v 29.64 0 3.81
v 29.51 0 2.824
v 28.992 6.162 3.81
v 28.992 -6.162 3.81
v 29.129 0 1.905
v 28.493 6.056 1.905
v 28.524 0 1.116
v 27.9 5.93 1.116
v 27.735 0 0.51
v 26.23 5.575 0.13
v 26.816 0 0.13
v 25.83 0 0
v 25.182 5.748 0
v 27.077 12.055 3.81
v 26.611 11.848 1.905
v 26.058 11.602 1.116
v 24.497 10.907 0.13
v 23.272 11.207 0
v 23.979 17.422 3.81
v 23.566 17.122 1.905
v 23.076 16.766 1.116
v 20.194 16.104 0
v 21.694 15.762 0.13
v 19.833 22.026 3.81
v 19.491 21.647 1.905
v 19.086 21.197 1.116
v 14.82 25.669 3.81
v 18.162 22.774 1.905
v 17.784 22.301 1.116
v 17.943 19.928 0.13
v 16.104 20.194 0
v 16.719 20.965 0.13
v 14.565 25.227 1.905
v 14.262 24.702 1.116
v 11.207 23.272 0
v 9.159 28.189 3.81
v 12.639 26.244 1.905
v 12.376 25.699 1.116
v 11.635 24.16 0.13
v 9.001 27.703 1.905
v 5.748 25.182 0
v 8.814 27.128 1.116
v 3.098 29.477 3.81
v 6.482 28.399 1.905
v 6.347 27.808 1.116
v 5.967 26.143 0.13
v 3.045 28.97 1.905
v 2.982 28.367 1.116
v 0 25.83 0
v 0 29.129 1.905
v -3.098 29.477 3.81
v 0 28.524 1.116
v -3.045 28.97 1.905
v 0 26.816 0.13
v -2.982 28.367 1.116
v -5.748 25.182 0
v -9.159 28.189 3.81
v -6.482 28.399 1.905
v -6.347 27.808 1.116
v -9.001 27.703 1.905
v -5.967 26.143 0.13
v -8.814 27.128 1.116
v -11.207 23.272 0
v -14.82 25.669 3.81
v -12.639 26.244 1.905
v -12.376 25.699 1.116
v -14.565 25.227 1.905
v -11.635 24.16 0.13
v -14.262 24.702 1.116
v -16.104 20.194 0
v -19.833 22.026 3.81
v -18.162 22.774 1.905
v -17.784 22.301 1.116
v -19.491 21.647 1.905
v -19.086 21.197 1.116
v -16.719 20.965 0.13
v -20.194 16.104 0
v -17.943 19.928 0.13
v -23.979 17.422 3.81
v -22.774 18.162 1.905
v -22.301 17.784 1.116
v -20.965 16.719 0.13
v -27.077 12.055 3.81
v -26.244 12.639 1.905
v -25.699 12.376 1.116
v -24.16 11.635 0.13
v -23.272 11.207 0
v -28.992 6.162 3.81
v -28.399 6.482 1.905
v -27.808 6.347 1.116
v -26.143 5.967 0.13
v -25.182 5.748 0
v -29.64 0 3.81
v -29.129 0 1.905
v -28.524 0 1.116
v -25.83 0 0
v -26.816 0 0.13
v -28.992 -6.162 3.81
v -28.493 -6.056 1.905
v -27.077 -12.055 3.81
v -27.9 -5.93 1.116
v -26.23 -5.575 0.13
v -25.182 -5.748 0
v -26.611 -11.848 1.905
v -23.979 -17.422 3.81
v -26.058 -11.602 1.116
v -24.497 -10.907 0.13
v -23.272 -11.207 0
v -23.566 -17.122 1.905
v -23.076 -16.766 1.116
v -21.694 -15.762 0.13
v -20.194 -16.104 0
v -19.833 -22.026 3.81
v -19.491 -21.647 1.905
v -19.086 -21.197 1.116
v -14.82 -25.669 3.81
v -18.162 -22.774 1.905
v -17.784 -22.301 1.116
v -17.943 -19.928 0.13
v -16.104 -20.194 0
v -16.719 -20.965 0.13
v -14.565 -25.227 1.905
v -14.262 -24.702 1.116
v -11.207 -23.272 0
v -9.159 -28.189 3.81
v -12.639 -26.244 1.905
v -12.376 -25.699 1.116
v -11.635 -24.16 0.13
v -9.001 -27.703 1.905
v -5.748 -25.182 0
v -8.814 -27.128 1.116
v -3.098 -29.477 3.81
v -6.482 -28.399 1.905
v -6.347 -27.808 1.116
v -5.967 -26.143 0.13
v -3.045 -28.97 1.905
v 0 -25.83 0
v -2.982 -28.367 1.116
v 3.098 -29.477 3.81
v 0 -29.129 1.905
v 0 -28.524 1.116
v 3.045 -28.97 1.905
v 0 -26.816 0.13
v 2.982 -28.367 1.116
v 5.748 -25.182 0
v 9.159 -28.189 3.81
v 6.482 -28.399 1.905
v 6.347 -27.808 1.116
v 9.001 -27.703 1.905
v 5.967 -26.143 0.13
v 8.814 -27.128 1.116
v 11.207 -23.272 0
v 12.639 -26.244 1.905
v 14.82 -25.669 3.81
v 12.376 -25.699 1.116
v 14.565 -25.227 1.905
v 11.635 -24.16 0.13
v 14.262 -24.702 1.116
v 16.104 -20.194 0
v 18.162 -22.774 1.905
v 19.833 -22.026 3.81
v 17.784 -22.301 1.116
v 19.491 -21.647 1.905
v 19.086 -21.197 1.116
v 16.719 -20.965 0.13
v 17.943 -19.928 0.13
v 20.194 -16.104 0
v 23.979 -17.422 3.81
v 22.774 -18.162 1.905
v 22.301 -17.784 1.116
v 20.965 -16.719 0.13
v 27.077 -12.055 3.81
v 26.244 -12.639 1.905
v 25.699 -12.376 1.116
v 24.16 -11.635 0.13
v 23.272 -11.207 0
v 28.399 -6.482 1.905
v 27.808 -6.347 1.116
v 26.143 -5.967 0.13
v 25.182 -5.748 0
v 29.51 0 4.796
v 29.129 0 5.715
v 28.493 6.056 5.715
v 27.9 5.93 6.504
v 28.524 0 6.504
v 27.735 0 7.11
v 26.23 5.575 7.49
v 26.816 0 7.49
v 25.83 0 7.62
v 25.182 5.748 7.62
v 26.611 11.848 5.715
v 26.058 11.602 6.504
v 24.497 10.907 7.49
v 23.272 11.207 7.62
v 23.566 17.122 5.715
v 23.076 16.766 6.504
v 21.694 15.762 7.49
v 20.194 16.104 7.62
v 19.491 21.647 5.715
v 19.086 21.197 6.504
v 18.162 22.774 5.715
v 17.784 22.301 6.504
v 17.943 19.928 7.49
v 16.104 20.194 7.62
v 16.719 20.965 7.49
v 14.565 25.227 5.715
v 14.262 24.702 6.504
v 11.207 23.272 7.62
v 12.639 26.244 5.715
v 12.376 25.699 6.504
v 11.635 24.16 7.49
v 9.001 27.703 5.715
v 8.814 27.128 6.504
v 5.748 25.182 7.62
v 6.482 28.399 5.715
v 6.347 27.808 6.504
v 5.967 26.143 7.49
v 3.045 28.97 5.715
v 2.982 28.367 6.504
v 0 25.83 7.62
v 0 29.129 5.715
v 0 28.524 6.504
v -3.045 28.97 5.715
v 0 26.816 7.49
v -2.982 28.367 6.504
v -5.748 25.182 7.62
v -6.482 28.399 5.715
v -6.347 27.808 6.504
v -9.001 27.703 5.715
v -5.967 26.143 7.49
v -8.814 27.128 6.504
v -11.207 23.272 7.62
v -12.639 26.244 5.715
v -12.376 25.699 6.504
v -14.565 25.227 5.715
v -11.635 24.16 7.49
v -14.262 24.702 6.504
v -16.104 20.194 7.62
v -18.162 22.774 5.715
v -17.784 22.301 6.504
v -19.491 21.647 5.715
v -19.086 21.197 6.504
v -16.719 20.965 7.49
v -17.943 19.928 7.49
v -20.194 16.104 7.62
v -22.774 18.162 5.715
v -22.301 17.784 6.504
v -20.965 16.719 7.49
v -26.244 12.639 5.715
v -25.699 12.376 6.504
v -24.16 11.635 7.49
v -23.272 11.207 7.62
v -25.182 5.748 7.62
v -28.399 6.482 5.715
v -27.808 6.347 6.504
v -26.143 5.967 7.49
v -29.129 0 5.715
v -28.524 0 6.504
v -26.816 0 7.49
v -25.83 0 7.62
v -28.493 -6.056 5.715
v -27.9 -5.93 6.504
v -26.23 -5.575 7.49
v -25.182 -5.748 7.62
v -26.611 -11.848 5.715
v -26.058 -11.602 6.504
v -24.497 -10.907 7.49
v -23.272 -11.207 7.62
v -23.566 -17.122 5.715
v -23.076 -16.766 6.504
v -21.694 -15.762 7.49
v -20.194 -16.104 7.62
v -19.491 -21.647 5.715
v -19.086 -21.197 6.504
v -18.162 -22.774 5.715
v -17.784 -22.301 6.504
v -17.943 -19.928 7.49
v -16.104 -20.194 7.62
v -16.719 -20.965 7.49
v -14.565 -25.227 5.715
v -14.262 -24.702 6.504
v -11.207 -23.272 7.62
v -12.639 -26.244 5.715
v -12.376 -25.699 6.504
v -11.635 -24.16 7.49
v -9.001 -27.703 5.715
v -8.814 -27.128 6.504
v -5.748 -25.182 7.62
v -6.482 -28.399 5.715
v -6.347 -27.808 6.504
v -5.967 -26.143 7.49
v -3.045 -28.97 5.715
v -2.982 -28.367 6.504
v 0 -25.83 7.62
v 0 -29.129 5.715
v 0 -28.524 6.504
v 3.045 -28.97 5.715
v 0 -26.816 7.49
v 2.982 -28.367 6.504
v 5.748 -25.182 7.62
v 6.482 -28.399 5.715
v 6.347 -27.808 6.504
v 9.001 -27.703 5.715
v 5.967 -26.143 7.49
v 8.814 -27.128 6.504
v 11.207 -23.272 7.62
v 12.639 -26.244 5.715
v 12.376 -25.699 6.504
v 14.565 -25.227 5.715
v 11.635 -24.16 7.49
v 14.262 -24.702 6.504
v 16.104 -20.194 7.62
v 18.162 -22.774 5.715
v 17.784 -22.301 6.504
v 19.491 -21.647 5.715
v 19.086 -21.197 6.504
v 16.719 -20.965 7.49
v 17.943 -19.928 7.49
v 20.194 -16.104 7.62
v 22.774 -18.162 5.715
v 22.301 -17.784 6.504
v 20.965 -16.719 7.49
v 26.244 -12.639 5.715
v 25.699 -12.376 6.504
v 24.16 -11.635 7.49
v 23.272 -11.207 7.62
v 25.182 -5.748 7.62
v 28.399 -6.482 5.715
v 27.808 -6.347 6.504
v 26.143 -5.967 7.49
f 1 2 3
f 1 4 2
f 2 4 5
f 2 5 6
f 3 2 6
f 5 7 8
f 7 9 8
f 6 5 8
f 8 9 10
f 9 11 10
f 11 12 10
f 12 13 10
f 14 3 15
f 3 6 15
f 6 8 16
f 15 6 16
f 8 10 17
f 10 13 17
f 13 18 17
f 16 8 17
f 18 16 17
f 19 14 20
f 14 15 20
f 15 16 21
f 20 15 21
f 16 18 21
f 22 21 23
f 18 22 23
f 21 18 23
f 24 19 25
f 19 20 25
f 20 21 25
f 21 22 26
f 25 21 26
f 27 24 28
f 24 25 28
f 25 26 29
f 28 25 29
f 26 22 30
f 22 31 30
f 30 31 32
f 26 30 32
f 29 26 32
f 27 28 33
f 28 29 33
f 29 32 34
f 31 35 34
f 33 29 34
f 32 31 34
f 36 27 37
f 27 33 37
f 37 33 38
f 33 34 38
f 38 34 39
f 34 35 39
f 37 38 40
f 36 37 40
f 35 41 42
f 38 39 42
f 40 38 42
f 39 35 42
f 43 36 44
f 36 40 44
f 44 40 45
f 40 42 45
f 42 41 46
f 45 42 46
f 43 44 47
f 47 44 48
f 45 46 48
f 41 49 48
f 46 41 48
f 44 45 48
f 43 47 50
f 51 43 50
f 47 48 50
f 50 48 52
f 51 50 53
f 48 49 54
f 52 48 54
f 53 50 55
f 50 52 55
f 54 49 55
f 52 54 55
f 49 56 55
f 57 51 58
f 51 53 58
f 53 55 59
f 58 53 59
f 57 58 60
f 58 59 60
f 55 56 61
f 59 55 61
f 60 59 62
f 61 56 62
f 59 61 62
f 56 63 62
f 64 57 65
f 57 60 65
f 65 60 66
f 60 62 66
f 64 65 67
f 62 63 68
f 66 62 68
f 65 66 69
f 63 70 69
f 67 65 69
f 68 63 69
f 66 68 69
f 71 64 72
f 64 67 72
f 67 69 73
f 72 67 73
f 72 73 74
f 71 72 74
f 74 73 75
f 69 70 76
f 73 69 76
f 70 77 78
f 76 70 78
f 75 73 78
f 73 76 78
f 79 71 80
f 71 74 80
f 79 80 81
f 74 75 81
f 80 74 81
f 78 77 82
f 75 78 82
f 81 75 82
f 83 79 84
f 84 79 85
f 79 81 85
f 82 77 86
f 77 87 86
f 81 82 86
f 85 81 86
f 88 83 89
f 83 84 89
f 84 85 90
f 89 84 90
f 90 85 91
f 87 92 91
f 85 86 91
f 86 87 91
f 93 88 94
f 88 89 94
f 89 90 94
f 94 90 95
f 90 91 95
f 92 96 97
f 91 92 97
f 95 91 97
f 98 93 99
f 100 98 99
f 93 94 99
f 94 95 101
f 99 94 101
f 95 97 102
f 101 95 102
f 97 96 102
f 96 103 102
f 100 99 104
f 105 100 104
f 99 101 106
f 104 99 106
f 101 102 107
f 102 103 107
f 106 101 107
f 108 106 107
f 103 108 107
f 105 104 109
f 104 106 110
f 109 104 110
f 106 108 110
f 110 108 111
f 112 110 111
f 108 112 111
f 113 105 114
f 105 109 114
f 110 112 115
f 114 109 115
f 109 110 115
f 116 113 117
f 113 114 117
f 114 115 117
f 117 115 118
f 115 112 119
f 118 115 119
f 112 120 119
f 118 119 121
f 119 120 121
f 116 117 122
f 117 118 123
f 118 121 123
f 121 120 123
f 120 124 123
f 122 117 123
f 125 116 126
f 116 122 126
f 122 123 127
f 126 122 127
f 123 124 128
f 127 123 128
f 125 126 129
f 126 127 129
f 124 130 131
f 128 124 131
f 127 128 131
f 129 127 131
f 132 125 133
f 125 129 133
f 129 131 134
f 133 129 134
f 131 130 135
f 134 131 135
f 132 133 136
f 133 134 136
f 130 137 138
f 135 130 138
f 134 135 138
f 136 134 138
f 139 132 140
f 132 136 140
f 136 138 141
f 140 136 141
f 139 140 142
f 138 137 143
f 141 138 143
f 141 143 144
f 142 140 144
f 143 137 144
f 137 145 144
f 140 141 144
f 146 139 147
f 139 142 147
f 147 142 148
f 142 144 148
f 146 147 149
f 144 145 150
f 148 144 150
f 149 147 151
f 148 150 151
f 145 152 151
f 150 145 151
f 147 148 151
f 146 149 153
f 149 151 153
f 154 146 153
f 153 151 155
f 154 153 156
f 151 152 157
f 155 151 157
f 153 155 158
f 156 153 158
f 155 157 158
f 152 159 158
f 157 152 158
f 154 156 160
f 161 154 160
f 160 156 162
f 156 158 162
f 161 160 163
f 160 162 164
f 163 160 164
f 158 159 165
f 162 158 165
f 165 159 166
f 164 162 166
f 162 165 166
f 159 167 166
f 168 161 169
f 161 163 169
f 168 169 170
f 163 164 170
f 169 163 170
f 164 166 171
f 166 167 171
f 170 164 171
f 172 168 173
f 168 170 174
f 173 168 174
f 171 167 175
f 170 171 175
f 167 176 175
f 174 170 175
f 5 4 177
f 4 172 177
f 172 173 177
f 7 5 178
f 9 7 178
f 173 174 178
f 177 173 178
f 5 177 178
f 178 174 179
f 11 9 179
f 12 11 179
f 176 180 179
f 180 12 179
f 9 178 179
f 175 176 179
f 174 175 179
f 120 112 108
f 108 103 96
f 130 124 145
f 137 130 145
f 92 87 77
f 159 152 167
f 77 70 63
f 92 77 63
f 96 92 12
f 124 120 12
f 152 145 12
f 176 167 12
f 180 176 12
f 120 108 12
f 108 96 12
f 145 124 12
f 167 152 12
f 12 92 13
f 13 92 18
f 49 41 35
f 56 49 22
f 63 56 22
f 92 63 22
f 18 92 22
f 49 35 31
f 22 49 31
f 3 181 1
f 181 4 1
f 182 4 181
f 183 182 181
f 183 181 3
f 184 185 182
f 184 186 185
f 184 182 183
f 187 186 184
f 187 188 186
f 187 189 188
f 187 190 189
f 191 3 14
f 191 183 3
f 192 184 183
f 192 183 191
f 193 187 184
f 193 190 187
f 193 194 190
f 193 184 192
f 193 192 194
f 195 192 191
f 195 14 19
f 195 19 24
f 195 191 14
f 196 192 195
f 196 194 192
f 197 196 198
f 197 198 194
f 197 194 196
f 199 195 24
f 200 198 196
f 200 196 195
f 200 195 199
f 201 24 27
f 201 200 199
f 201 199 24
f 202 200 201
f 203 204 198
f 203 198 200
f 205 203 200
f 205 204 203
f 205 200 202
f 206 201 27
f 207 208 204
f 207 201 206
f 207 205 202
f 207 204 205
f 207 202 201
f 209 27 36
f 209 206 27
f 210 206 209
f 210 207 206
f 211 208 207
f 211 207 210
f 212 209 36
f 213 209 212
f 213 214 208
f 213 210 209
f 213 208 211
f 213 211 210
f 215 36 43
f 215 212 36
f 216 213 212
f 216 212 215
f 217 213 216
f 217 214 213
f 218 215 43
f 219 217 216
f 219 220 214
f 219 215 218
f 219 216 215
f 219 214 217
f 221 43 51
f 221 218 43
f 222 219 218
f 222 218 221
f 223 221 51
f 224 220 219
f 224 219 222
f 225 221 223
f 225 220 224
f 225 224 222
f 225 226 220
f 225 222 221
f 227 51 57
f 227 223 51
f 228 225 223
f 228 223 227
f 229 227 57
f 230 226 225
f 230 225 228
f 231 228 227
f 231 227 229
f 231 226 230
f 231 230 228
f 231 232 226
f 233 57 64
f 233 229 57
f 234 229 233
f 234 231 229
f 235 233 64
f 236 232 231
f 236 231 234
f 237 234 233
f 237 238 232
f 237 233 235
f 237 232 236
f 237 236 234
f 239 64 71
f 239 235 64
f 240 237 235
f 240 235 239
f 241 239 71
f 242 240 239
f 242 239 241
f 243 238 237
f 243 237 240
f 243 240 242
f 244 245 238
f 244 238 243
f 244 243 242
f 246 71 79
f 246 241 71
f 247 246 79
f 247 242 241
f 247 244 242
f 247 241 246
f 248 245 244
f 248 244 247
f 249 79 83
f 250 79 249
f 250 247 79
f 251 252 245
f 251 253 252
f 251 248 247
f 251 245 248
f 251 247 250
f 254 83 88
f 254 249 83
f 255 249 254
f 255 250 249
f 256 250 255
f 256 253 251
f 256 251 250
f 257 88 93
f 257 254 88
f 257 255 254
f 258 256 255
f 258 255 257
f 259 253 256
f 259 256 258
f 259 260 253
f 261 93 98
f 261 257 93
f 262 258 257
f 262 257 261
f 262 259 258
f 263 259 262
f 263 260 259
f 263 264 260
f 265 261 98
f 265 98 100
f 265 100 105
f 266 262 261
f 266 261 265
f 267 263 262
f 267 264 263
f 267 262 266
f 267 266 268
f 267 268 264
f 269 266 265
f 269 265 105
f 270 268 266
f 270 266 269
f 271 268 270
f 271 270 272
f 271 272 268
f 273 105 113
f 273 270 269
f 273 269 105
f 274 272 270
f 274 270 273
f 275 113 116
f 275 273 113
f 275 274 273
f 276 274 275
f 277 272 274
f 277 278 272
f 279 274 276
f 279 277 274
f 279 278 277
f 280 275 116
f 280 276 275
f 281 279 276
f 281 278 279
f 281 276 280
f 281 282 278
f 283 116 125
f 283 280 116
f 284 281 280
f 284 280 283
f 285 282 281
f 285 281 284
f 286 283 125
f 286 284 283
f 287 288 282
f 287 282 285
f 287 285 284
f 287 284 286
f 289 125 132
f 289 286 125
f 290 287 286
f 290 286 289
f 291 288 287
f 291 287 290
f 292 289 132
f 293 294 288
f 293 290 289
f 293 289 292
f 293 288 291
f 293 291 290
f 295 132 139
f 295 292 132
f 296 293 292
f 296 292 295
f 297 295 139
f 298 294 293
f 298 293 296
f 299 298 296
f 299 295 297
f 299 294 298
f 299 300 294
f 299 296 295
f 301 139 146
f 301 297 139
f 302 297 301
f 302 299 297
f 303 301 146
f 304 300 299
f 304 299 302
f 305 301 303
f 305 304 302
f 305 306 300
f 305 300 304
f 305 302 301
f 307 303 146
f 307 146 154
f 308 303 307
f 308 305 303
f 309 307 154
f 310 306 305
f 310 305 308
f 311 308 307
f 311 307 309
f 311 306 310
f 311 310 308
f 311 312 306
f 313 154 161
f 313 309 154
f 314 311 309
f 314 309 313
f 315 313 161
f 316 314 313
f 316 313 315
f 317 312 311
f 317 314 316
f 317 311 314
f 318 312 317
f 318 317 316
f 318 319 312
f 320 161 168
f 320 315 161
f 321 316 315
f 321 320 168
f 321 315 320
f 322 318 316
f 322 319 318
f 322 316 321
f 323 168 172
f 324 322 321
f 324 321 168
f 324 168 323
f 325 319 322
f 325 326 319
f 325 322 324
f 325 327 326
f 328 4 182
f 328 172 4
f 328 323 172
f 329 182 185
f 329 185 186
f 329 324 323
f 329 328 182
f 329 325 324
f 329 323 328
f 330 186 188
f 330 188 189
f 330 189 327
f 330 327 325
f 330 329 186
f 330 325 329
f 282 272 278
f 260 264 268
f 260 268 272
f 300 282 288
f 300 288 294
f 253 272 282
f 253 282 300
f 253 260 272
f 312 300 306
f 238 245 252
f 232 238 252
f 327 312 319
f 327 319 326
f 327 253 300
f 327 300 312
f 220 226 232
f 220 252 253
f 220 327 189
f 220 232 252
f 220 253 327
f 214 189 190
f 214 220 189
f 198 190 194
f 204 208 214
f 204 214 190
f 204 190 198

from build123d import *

# Parameters (mm, degrees)
F0_R     = 29.6395356571
F1_DEPTH = 7.62
F2_R     = 3.81
F3_R     = 3.80999


# Not quite as in the source:
# - a fillet or chamfer is up to 0.001 mm smaller than in the source, because OpenCascade refuses the exact size


with BuildPart() as f1:
    # F0 (on Top) → F1 (new body)
    with BuildSketch(Plane.XY):
        Circle(F0_R)
    extrude(amount=F1_DEPTH)

    # F2
    f2_edges = [f1.edges().sort_by_distance(p)[0] for p in [
        (-29.639536, 0, 7.62),
    ]]
    fillet(f2_edges, radius=F2_R)

    # F3 (radius 3.81 in the source; OpenCascade refuses exactly that, so slightly less here)
    f3_edges = [f1.edges().sort_by_distance(p)[0] for p in [
        (-29.639536, 0, 0),
    ]]
    fillet(f3_edges, radius=F3_R)


solid = f1.part
